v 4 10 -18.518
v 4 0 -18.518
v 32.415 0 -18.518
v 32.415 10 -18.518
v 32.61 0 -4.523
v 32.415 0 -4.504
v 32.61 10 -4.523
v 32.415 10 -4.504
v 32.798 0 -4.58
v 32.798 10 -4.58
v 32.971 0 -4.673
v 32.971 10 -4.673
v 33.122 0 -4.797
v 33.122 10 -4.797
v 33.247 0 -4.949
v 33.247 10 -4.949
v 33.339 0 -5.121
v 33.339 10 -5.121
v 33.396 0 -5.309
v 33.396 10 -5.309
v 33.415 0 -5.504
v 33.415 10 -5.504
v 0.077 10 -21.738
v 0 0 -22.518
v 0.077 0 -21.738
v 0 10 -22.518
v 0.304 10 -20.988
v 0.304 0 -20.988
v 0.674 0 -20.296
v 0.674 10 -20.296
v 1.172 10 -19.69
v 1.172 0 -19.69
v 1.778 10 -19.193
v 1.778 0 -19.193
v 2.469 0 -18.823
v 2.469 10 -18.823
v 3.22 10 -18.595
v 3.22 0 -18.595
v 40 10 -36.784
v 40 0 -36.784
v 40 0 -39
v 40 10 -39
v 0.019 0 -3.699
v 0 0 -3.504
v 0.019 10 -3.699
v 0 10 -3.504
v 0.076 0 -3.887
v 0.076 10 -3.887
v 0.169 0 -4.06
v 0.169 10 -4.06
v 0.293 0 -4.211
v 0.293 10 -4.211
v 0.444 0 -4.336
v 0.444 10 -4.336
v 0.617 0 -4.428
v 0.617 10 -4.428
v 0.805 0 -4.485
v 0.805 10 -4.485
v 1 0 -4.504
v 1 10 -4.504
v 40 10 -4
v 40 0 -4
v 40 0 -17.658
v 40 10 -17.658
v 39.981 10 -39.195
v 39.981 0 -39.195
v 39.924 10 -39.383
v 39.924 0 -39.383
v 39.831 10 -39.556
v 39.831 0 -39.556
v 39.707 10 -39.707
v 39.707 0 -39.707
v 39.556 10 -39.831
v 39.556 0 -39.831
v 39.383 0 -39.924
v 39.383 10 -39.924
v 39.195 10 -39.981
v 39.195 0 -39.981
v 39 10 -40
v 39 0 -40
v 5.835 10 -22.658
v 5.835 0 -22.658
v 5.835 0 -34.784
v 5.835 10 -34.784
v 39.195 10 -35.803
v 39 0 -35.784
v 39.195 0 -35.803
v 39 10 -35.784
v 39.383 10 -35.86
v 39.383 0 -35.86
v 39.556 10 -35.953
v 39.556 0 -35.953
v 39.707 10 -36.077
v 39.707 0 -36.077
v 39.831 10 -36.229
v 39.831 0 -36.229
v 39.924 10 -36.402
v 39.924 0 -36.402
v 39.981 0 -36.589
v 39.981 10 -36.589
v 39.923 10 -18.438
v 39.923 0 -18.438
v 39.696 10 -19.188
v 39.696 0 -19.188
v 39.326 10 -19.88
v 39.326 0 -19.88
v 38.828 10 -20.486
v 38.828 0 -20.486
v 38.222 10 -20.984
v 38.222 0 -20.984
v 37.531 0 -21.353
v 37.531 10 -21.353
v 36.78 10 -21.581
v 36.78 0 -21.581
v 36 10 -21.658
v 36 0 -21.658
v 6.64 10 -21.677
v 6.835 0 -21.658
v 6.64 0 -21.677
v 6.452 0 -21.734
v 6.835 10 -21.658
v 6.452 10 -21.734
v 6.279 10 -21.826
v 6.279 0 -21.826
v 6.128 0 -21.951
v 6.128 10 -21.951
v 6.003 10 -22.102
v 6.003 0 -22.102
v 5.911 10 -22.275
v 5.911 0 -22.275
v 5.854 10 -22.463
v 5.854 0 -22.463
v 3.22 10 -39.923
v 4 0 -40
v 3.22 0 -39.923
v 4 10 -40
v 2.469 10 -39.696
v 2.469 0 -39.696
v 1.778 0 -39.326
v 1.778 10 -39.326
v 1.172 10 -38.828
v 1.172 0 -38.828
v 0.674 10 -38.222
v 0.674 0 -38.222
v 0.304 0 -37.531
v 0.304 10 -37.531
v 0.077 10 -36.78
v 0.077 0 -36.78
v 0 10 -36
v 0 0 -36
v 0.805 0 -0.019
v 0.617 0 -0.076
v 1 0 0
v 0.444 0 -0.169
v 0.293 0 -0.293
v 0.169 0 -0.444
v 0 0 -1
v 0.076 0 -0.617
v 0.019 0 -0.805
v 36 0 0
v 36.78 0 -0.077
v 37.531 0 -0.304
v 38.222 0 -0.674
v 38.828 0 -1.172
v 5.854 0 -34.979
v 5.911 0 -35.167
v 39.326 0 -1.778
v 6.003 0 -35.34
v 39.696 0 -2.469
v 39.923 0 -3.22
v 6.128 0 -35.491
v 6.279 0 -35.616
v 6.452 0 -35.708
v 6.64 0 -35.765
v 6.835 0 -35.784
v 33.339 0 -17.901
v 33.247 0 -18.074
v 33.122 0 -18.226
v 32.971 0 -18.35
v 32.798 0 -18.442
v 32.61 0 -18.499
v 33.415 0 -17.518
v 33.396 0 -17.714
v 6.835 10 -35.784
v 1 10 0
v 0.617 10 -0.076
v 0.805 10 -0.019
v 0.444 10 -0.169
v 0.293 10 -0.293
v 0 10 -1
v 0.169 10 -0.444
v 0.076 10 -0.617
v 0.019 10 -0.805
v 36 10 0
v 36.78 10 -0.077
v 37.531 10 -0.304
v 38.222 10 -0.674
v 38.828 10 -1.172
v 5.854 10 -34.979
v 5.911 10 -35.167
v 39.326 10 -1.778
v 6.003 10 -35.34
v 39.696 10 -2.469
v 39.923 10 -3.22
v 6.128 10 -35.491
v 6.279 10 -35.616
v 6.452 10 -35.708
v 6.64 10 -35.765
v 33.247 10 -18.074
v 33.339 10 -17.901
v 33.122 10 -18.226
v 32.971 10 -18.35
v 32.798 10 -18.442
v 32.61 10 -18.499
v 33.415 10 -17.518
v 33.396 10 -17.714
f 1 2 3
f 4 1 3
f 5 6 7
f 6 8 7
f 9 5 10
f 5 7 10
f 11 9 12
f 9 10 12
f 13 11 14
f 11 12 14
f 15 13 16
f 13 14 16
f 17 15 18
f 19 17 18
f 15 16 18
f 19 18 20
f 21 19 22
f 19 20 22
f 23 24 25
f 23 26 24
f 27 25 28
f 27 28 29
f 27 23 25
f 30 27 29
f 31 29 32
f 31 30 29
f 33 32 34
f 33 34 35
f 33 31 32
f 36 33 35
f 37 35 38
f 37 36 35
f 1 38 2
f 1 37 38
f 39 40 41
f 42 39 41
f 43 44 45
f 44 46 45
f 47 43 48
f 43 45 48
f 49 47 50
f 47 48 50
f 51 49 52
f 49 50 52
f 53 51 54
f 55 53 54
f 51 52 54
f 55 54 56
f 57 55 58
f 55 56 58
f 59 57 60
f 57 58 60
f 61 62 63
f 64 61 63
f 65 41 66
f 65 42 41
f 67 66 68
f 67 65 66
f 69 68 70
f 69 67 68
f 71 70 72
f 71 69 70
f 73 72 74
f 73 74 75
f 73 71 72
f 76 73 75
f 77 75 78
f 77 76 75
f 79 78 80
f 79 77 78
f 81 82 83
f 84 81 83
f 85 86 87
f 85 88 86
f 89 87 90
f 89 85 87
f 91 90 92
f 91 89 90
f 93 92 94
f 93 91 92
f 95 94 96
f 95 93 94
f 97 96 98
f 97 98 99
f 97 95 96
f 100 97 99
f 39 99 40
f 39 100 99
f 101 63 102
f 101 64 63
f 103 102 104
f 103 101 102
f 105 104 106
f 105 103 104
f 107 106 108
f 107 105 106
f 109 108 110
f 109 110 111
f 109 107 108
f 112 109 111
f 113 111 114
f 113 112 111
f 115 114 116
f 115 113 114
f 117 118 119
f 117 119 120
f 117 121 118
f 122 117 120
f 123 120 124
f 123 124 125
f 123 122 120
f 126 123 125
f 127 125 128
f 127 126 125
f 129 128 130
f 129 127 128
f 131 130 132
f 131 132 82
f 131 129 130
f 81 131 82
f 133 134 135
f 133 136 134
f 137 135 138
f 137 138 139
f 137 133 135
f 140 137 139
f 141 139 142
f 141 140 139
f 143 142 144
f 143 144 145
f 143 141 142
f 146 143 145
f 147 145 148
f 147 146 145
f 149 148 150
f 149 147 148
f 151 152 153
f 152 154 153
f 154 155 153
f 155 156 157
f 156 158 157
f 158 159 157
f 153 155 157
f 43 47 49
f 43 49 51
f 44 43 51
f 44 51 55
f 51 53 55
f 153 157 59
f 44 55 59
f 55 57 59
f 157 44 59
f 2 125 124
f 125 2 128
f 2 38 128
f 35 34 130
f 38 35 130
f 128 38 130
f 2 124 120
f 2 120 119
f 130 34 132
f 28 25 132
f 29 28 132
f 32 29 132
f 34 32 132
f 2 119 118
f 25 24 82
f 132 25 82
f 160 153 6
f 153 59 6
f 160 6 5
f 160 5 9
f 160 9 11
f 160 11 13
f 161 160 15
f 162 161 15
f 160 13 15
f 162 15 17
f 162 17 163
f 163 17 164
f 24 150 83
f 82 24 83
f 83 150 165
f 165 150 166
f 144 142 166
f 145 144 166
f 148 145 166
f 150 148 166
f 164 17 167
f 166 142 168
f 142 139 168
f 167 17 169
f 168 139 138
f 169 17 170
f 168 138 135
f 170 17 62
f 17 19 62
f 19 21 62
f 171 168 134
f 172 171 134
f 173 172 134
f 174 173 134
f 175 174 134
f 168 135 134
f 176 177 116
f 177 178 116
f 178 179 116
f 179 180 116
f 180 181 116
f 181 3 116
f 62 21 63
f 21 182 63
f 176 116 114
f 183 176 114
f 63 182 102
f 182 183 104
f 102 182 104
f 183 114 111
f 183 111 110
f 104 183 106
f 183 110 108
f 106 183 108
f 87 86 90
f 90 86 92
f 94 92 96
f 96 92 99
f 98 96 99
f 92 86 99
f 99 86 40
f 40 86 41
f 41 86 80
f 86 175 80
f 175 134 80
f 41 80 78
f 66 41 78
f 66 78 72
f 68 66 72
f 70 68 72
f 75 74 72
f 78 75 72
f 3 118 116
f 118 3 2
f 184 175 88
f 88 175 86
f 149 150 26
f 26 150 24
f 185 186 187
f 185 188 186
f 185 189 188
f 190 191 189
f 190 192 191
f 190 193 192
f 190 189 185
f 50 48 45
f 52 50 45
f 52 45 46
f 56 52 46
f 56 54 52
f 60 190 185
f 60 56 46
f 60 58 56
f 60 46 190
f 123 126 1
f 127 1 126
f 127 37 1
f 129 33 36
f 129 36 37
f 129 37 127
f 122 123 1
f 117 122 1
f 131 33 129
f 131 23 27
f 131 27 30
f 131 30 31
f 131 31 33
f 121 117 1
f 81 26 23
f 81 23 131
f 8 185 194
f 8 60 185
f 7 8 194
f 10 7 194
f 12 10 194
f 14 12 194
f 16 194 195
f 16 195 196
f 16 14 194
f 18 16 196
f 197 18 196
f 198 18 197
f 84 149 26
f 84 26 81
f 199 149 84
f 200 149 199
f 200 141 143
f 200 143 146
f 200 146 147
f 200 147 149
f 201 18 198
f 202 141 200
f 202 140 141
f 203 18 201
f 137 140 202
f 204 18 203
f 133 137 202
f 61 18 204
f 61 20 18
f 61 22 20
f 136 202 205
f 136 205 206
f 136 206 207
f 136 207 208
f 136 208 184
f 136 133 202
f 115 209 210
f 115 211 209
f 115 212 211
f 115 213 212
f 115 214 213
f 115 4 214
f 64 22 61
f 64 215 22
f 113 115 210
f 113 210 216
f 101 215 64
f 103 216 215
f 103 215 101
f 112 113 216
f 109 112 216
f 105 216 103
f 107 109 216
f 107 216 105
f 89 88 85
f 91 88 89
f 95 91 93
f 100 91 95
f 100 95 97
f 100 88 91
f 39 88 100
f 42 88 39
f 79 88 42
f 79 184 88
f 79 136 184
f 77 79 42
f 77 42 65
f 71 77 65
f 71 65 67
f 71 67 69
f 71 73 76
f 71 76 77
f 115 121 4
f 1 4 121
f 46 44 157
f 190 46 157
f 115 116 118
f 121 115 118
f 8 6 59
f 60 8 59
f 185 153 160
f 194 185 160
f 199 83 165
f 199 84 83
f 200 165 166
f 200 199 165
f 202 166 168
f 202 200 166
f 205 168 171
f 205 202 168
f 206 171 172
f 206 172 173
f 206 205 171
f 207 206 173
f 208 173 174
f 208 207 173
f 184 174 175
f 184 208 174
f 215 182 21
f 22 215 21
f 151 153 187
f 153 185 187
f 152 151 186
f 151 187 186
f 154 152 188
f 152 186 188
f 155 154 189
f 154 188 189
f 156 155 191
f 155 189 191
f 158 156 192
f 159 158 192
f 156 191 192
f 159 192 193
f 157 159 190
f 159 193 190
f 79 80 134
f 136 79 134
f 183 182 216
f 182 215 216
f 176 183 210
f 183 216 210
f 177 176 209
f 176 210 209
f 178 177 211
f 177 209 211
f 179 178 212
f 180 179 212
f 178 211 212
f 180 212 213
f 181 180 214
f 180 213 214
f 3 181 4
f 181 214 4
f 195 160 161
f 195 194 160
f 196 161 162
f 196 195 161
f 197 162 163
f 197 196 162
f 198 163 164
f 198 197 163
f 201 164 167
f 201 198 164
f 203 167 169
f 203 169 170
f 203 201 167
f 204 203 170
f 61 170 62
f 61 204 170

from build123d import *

# Parameters (mm, degrees)
BOSS_EXTRUDE1_DEPTH = 10
FILLET1_R           = 4
FILLET2_R           = 1


with BuildPart() as part:
    # Sketch1 → Boss-Extrude1 (new body)
    with BuildSketch(Plane(origin=(0, 0, 0), x_dir=(1, 0, 0), z_dir=(0, 1, 0))):
        Polygon((0, 4.504109696), (0, 0), (33.415268294, 0), (40, 0), (40, 4.504109696), (40, 18.518496951), (40, 21.657719696), (33.415268294, 21.657719696), (5.834954176, 21.657719696), (5.834954176, 35.784222049), (40, 35.784222049), (40, 40), (5.834954176, 40), (0, 40), (0, 35.784222049), (0, 21.657719696), (0, 18.518496951), (33.415268294, 18.518496951), (33.415268294, 4.504109696), align=None)
    extrude(amount=BOSS_EXTRUDE1_DEPTH)

    # Fillet1
    fillet1_edges = [part.edges().sort_by_distance(p)[0] for p in [
        (0, 5, -18.518496951),
        (0, 5, -40),
        (40, 5, -21.657719696),
        (40, 5, 0),
    ]]
    fillet(fillet1_edges, radius=FILLET1_R)

    # Fillet2
    fillet2_edges = [part.edges().sort_by_distance(p)[0] for p in [
        (33.415268294, 5, -18.518496951),
        (40, 5, -40),
        (40, 5, -35.784222049),
        (5.834954176, 5, -35.784222049),
        (5.834954176, 5, -21.657719696),
        (0, 5, 0),
        (0, 5, -4.504109696),
        (33.415268294, 5, -4.504109696),
    ]]
    fillet(fillet2_edges, radius=FILLET2_R)


solid = part.part
